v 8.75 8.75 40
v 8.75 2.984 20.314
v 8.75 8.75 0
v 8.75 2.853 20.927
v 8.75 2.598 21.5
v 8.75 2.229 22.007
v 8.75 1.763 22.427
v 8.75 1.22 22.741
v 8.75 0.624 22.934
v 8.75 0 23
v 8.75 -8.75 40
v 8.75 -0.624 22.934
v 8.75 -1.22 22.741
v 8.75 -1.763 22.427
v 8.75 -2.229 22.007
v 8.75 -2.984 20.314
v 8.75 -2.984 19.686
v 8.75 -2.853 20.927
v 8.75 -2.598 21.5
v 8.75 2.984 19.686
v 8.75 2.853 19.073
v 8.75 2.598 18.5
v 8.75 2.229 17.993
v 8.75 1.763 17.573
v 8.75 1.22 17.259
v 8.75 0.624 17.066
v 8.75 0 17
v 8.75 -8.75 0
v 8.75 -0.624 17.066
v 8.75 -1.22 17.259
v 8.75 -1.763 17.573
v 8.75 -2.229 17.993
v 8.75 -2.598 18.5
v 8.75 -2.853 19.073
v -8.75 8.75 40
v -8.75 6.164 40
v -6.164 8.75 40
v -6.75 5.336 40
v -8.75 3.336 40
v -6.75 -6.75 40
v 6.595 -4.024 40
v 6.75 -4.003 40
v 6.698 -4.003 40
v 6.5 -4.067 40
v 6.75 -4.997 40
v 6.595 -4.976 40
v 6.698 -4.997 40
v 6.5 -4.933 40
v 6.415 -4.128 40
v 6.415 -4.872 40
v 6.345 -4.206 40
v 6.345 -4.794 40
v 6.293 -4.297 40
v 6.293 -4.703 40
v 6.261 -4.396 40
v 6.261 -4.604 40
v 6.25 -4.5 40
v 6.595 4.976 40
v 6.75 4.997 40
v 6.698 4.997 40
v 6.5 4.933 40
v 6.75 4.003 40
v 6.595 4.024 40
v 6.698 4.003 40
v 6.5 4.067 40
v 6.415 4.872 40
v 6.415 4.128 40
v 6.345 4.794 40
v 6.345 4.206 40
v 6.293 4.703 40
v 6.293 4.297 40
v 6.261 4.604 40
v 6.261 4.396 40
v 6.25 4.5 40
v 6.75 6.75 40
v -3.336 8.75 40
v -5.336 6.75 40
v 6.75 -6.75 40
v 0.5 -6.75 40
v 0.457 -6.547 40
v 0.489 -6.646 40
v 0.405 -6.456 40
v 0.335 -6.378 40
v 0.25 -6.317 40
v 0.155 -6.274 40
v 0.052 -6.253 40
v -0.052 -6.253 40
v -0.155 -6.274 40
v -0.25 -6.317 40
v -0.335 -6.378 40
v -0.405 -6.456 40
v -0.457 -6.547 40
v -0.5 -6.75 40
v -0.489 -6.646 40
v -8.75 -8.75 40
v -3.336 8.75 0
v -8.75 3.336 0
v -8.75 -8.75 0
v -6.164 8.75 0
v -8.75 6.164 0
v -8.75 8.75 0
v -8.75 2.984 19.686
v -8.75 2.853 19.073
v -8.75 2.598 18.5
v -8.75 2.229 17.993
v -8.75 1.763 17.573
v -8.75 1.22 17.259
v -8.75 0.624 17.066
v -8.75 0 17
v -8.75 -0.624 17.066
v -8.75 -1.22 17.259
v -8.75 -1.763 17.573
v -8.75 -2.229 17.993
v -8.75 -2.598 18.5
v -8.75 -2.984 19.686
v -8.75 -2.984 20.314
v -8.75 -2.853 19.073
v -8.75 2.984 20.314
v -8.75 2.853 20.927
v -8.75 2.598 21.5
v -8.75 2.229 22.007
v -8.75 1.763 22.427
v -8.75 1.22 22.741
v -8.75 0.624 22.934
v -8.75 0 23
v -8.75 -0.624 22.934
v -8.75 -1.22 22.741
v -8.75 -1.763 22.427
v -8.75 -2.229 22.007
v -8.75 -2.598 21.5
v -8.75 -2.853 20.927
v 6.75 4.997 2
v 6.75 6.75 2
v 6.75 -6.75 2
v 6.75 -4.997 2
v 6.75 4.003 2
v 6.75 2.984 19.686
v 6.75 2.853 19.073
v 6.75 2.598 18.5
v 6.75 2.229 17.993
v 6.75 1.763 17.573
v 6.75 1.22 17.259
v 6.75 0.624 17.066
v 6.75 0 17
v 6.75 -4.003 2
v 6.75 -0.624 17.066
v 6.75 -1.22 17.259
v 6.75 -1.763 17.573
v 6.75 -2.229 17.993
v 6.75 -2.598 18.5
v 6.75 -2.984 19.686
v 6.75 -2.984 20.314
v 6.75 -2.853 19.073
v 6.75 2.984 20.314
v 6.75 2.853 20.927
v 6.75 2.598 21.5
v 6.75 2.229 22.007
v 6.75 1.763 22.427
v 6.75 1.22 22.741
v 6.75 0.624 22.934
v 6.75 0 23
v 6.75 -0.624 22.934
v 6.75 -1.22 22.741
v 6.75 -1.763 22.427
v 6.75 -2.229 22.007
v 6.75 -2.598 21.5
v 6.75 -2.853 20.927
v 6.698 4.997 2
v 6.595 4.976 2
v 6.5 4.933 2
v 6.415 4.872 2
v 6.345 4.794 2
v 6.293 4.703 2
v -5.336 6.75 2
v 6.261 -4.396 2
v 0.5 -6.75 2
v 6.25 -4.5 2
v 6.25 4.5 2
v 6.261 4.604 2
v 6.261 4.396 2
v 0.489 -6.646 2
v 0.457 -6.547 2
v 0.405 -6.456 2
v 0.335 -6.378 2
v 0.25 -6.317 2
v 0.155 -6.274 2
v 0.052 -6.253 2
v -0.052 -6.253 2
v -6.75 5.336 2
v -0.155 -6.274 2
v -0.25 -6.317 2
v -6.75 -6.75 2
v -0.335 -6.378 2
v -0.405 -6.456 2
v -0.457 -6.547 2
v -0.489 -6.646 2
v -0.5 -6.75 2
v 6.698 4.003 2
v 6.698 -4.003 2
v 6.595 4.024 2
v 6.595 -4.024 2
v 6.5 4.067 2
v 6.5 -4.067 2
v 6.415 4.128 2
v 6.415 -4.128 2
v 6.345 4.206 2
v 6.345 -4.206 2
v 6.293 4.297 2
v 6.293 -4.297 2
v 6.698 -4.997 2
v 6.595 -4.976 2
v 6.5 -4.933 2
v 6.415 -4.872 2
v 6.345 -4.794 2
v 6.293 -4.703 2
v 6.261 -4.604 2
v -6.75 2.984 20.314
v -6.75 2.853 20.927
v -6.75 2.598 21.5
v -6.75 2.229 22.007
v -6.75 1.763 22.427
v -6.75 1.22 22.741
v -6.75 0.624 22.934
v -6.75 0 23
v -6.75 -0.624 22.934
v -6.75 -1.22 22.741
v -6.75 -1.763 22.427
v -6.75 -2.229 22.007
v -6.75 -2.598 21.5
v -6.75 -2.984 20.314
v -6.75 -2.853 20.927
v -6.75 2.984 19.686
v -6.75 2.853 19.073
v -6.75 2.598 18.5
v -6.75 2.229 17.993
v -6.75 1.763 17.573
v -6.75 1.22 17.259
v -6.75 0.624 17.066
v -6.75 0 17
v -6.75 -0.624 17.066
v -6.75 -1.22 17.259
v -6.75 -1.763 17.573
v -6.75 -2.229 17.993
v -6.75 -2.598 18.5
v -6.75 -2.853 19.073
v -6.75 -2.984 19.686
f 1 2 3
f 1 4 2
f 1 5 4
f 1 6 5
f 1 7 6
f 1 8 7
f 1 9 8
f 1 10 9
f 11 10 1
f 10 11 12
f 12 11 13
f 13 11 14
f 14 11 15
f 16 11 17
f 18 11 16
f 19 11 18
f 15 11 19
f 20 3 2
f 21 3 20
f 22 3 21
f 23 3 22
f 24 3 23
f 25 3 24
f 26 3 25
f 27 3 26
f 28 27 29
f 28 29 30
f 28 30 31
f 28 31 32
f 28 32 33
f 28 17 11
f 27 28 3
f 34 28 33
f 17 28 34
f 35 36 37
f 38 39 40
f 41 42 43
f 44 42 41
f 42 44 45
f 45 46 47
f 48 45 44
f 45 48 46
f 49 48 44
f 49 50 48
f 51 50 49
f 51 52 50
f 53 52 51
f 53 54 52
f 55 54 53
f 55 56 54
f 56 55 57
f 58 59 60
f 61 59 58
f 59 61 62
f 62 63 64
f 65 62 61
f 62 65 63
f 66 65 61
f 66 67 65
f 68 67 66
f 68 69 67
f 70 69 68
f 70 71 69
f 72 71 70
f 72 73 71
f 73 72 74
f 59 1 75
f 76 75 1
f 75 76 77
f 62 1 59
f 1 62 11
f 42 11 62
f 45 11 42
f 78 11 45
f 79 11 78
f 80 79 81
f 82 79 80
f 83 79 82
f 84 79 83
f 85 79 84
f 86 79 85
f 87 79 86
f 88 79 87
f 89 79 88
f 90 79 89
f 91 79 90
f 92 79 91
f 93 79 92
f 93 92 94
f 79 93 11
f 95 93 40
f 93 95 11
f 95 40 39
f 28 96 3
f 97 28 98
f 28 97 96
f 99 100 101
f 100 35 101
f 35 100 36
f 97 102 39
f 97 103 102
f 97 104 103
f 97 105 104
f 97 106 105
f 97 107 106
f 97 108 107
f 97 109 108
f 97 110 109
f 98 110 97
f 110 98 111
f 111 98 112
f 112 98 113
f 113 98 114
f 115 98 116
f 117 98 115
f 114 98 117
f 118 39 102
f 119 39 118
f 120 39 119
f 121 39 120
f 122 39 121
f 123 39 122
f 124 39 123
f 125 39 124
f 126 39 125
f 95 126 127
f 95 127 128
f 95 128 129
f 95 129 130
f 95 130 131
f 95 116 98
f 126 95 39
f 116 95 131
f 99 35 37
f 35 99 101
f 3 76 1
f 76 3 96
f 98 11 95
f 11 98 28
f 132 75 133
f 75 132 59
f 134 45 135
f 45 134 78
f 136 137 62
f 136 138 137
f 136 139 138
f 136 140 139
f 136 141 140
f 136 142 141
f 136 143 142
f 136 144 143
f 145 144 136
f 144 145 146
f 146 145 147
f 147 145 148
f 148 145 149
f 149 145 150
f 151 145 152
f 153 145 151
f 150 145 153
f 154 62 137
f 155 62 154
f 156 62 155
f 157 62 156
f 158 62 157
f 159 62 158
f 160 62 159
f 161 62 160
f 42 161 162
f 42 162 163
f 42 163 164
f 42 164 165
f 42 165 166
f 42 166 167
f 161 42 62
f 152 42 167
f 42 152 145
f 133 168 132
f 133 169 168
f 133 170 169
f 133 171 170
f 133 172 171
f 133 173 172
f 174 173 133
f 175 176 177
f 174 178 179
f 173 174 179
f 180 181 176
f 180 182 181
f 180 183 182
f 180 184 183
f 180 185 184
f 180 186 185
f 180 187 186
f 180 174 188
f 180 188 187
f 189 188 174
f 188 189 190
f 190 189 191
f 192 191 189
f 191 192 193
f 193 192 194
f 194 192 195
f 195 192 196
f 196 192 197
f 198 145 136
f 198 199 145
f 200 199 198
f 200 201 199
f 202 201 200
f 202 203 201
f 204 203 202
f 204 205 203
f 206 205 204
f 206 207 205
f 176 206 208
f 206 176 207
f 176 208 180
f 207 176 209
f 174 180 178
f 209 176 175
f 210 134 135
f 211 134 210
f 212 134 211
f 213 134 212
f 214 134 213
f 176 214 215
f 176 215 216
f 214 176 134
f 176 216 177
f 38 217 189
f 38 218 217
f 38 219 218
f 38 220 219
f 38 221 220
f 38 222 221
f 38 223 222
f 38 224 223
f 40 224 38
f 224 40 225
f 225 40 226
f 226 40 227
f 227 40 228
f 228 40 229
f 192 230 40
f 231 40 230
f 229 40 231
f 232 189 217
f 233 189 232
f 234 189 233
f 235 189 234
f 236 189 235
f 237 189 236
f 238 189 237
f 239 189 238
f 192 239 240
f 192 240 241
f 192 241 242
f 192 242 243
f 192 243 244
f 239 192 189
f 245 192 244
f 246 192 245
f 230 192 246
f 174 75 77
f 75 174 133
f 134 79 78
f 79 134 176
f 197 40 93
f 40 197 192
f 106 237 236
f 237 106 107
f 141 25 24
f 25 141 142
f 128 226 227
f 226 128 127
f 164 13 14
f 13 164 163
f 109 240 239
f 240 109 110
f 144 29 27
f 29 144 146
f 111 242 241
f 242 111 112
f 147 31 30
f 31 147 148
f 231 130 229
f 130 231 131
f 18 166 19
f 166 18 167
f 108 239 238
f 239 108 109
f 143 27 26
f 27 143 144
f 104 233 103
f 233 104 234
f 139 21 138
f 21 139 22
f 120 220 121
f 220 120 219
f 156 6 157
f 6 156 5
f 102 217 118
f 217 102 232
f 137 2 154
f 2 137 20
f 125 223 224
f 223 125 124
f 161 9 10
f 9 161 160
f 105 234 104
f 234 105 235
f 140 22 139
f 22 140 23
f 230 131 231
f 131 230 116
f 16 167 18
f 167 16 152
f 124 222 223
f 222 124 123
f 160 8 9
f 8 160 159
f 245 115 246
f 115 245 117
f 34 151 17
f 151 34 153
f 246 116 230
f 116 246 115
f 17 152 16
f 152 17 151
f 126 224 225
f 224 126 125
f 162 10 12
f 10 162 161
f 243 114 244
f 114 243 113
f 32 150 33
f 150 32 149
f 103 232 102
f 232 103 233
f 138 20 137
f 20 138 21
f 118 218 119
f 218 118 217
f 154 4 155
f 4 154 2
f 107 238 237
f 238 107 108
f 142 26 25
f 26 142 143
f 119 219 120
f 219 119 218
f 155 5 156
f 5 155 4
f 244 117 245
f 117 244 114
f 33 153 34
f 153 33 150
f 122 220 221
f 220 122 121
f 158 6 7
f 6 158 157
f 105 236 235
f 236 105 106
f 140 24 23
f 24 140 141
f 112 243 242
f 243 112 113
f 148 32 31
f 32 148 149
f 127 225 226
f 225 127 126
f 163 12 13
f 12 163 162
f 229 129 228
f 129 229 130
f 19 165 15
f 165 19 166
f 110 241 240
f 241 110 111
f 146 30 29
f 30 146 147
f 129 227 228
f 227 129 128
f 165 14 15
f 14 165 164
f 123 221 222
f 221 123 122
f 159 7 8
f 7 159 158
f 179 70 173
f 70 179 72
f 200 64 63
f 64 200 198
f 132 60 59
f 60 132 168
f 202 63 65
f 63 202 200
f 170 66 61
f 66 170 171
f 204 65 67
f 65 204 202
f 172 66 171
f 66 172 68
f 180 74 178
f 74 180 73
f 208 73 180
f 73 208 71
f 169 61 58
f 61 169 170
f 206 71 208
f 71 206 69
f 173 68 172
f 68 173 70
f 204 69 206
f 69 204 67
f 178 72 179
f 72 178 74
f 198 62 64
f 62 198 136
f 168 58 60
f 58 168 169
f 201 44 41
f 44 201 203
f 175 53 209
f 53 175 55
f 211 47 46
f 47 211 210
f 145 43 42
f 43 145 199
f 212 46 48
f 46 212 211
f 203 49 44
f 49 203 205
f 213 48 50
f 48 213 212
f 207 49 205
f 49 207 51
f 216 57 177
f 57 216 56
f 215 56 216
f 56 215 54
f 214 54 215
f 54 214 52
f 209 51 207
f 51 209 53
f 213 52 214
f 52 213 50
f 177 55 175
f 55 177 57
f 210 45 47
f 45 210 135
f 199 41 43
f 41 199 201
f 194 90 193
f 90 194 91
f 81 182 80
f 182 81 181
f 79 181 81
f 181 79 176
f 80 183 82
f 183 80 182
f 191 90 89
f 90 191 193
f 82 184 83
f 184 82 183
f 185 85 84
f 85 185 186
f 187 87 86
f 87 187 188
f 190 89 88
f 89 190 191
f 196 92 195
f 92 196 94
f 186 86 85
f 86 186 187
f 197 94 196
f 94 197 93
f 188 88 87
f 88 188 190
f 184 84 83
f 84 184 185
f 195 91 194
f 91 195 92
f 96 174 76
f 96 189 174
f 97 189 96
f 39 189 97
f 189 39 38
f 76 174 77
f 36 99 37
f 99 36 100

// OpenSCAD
$fn=30;

window_diam = 6;
window_height=15;

cuvette_dim=12.5;
rod_radius=.5;
holder_side=cuvette_dim+rod_radius*2;
holder_depth=40;
wall_width=2;
outer_side=holder_side+wall_width*2;

paddle_width=wall_width;

module holder(){
translate([0,0,holder_depth/2]) {
difference(){
    cube([outer_side,outer_side,holder_depth],center=true);
   
    // inner cavity
    translate([0,0,wall_width]) 
cube([holder_side,holder_side,holder_depth],center=true);
    
    //  optical window
    //translate([outer_side/2,0,0])
rotate([0,90,0])
cylinder(h=holder_side*2,r1=window_diam/2,r2=window_diam/2,center=true);
}



// two points along y on positive x side
translate([cuvette_dim/2+rod_radius,holder_side/3,0])
cylinder(h=holder_depth,r1=rod_radius,r2=rod_radius,center=true);

translate([cuvette_dim/2+rod_radius,-holder_side/3,0])
cylinder(h=holder_depth,r1=rod_radius,r2=rod_radius,center=true);

translate([0,-cuvette_dim/2-rod_radius,0])
cylinder(h=holder_depth,r1=rod_radius,r2=rod_radius,center=true);
}
}

//holder();

/*
rotate(a=10, v=[1,0,0]) {
    translate([outer_side/2,outer_side/2,0])
rotate([0,0,120]) 
    cube([10,3,holder_depth]);  
}
*/

//rotate(a=90,v=[0,0,1]) {
   /* rotate([0,0,90]) {
translate([-holder_side/2,0,0])
cube([paddle_width,holder_side,holder_depth]);
}
*/

difference() {
 
holder();
 
//corner removal    
translate([-holder_side/2,holder_side/2,holder_depth/2])
rotate([0,0,-45]) 
cube([paddle_width,holder_side*2,holder_depth*1.1],center=true);

}
/*
translate([0,0,0]) {
    union() {
        //cube(15, center=true);
        cylinder(h=15,r1=5,r2=5,center=true);
    }
}
*/
